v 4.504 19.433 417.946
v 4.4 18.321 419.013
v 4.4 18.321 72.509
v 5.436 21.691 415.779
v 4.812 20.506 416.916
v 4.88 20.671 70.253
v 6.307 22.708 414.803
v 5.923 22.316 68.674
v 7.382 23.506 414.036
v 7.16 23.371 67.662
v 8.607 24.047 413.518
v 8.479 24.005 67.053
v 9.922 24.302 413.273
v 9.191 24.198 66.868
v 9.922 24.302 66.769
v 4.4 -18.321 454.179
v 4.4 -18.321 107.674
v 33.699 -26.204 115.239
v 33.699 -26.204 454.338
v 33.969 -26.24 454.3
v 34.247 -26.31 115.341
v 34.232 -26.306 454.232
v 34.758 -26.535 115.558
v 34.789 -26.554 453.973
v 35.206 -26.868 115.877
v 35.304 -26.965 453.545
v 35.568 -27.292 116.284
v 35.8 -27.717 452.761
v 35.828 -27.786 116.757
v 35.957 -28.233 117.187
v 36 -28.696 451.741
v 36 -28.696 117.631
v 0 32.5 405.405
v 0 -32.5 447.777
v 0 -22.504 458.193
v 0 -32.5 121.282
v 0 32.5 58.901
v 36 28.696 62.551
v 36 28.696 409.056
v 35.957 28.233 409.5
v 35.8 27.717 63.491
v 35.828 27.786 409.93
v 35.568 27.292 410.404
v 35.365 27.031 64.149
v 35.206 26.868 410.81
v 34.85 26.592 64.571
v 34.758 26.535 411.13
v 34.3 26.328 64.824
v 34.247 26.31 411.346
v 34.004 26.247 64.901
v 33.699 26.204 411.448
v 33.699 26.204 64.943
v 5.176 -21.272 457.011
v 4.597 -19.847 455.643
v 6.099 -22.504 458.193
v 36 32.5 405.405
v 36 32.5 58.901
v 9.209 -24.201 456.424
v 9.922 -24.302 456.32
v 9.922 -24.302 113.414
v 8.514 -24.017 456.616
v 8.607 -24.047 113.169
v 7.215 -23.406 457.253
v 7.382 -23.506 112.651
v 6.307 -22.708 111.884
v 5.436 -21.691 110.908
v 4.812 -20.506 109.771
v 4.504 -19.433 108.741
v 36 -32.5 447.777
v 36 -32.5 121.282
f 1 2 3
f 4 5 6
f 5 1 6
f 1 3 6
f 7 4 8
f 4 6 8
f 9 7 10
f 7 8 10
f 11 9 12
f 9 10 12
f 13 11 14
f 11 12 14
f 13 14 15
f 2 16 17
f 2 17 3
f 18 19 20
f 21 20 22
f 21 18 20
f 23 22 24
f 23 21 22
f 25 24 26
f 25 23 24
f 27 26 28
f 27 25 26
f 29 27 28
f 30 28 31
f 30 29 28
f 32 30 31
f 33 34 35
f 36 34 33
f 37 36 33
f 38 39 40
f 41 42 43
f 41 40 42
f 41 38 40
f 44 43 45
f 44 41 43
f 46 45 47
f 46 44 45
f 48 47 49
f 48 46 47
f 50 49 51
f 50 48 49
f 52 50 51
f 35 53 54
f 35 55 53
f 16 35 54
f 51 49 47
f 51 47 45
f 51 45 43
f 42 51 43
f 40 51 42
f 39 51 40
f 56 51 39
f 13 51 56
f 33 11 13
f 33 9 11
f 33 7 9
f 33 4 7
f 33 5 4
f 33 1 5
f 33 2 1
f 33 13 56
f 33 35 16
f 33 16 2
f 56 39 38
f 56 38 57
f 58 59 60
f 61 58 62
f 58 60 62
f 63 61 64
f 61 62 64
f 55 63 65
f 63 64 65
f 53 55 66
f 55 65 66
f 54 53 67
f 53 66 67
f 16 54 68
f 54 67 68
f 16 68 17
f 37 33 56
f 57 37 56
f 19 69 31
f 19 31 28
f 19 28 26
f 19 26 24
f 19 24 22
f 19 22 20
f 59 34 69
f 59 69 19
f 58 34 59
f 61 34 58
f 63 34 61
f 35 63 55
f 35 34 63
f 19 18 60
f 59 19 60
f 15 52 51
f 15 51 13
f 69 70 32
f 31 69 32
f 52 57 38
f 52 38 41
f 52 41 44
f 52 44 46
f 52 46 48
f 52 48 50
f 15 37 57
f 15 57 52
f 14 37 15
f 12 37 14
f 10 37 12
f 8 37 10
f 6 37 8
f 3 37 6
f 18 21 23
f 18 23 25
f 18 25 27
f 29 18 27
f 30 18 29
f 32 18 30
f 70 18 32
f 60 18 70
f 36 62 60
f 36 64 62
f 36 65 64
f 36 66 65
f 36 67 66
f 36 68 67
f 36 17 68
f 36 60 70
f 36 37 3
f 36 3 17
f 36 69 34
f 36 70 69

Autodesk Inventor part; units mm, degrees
ref_plane "Начальная плоскость" through (0, 0, 58.9006) normal (0, 0, 1) x (1, 0, 0)
ref_plane "Конечная плоскость" through (0, 0, 458.193) normal (0, 0, 1) x (1, 0, 0)
sketch "Эскиз" plane through (0, 0, 0) normal (0, 0, 1) x (1, 0, 0)
  line L0 (36, -32.5) -> (0, -32.5)
  line L1 (36, -32.5) -> (36, -28.696)
  line L2 (33.6994, -26.2039) -> (9.9215, -24.3017)
  line L3 (4.4, -18.3208) -> (4.4, 18.3208)
  line L4 (33.6994, 26.2039) -> (9.9215, 24.3017)
  line L5 (36, 28.696) -> (36, 32.5)
  line L6 (0, 32.5) -> (36, 32.5)
  line L7 (0, -32.5) -> (0, 32.5)
  arc A0 (4.4, -18.3208) -> (9.9215, -24.3017) centre (10.4, -18.3208) ccw
  arc A1 (9.9215, 24.3017) -> (4.4, 18.3208) centre (10.4, 18.3208) ccw
  arc A2 (36, -28.696) -> (33.6994, -26.2039) centre (33.5, -28.696) ccw
  arc A3 (33.6994, 26.2039) -> (36, 28.696) centre (33.5, 28.696) ccw
  line L8 (0, 45.5) -> (0, -45.5) construction
  line L9 (-7.2974, 0) -> (43.7847, 0) construction
  point P0 (36, -26.388)
  point P1 (4.4, -23.86)
  point P2 (4.4, 23.86)
  point P3 (36, 26.388)
  dimension "d3" = 36
  dimension "d5" = 4.4
  dimension "d7" = 65
  dimension "d9" = 8.64
  dimension "d11" = 8.64
  dimension "d13" = 6.112
  dimension "d15" = 6.112
  dimension "d22" = 6
  dimension "d23" = 2.5
  dimension "d24" = 32.5
  dimension "d25" = 0
extrude "Тело" add sketch "Эскиз" along normal up to surface (399.2924 mm away) from surface at 58.9006
sketch "Sketch3" plane through (0, 0, 0) normal (0, 0, 1) x (1, 0, 0)
  line L0 (0, 0) -> (10, 0)
ref_plane "Work Plane7" through (0, 0, 0) normal (0, -1, 0) x (1, 0, 0)
sketch "Sketch4" plane through (0, 0, 0) normal (0, -1, 0) x (1, 0, 0)
  line L0 (-2, 58.9006) -> (12, 58.9006)
  line L1 (-2, 458.193) -> (12, 458.193)
  dimension "d29" = 399.2924
ref_plane "РабПлоскость8" through (0, 285.6248, -184.0264) normal (0, -0.6924238, -0.721491) x (1, 0, 0)
split "Разделение1" plane through (0, 285.6248, -184.0264) removes the side toward (0, -0.6924238, -0.721491)
ref_plane "РабПлоскость9" through (36, 458.7307, -3.6537) normal (0, 0.6924238, 0.721491) x (1, 0, 0)
split "Разделение2" plane through (36, 458.7307, -3.6537) removes the side toward (0, 0.6924238, 0.721491)
ref_plane "РабПлоскость10" through (-29, 195.6464, 685.5009) normal (0, -0.721491, 0.6924238) x (1, 0, 0)
split "Разделение3" plane through (-29, 195.6464, 685.5009) removes the side toward (0, -0.721491, 0.6924238)
equation "\"d3\" = b"
equation "\"d5\" = t1"
equation "\"d7\" = ParH"
equation "\"d9\" = msp_x1 + t2"
equation "\"d11\" = msp_x1 + t2"
equation "\"d13\" = -msp_x2 + t2"
equation "\"d15\" = -msp_x2 + t2"
equation "\"d22\" = R"
equation "\"d23\" = R1"
equation "\"d24\" = 0.5 * d7"
equation "\"d16\" = G_L"
equation "\"R1\" = 2.5"
equation "\"R\" = 6"
equation "\"t1\" = 4.4"
equation "\"t2\" = 7.2"
equation "\"ParH\" = 65"
equation "\"b\" = 36"
equation "\"msp_x1\" = 0.04 * b"
equation "\"msp_x2\" = -0.08 * t1 + 0.04 * b"
equation "\"G_L\" = d29"
equation "\"ex\" = 0"
equation "\"G_OFFSET_START\" = -58.90056"
equation "\"G_OFFSET_END\" = -23.44846"
equation "\"d26\" = -G_OFFSET_START"
equation "\"d27\" = G_OFFSET_END + B_L"
equation "\"B_L\" = 481.64146"
properties part number "Швеллер 6.5U-399,29 ГОСТ 8240-97" material "Сталь, мягкая"
